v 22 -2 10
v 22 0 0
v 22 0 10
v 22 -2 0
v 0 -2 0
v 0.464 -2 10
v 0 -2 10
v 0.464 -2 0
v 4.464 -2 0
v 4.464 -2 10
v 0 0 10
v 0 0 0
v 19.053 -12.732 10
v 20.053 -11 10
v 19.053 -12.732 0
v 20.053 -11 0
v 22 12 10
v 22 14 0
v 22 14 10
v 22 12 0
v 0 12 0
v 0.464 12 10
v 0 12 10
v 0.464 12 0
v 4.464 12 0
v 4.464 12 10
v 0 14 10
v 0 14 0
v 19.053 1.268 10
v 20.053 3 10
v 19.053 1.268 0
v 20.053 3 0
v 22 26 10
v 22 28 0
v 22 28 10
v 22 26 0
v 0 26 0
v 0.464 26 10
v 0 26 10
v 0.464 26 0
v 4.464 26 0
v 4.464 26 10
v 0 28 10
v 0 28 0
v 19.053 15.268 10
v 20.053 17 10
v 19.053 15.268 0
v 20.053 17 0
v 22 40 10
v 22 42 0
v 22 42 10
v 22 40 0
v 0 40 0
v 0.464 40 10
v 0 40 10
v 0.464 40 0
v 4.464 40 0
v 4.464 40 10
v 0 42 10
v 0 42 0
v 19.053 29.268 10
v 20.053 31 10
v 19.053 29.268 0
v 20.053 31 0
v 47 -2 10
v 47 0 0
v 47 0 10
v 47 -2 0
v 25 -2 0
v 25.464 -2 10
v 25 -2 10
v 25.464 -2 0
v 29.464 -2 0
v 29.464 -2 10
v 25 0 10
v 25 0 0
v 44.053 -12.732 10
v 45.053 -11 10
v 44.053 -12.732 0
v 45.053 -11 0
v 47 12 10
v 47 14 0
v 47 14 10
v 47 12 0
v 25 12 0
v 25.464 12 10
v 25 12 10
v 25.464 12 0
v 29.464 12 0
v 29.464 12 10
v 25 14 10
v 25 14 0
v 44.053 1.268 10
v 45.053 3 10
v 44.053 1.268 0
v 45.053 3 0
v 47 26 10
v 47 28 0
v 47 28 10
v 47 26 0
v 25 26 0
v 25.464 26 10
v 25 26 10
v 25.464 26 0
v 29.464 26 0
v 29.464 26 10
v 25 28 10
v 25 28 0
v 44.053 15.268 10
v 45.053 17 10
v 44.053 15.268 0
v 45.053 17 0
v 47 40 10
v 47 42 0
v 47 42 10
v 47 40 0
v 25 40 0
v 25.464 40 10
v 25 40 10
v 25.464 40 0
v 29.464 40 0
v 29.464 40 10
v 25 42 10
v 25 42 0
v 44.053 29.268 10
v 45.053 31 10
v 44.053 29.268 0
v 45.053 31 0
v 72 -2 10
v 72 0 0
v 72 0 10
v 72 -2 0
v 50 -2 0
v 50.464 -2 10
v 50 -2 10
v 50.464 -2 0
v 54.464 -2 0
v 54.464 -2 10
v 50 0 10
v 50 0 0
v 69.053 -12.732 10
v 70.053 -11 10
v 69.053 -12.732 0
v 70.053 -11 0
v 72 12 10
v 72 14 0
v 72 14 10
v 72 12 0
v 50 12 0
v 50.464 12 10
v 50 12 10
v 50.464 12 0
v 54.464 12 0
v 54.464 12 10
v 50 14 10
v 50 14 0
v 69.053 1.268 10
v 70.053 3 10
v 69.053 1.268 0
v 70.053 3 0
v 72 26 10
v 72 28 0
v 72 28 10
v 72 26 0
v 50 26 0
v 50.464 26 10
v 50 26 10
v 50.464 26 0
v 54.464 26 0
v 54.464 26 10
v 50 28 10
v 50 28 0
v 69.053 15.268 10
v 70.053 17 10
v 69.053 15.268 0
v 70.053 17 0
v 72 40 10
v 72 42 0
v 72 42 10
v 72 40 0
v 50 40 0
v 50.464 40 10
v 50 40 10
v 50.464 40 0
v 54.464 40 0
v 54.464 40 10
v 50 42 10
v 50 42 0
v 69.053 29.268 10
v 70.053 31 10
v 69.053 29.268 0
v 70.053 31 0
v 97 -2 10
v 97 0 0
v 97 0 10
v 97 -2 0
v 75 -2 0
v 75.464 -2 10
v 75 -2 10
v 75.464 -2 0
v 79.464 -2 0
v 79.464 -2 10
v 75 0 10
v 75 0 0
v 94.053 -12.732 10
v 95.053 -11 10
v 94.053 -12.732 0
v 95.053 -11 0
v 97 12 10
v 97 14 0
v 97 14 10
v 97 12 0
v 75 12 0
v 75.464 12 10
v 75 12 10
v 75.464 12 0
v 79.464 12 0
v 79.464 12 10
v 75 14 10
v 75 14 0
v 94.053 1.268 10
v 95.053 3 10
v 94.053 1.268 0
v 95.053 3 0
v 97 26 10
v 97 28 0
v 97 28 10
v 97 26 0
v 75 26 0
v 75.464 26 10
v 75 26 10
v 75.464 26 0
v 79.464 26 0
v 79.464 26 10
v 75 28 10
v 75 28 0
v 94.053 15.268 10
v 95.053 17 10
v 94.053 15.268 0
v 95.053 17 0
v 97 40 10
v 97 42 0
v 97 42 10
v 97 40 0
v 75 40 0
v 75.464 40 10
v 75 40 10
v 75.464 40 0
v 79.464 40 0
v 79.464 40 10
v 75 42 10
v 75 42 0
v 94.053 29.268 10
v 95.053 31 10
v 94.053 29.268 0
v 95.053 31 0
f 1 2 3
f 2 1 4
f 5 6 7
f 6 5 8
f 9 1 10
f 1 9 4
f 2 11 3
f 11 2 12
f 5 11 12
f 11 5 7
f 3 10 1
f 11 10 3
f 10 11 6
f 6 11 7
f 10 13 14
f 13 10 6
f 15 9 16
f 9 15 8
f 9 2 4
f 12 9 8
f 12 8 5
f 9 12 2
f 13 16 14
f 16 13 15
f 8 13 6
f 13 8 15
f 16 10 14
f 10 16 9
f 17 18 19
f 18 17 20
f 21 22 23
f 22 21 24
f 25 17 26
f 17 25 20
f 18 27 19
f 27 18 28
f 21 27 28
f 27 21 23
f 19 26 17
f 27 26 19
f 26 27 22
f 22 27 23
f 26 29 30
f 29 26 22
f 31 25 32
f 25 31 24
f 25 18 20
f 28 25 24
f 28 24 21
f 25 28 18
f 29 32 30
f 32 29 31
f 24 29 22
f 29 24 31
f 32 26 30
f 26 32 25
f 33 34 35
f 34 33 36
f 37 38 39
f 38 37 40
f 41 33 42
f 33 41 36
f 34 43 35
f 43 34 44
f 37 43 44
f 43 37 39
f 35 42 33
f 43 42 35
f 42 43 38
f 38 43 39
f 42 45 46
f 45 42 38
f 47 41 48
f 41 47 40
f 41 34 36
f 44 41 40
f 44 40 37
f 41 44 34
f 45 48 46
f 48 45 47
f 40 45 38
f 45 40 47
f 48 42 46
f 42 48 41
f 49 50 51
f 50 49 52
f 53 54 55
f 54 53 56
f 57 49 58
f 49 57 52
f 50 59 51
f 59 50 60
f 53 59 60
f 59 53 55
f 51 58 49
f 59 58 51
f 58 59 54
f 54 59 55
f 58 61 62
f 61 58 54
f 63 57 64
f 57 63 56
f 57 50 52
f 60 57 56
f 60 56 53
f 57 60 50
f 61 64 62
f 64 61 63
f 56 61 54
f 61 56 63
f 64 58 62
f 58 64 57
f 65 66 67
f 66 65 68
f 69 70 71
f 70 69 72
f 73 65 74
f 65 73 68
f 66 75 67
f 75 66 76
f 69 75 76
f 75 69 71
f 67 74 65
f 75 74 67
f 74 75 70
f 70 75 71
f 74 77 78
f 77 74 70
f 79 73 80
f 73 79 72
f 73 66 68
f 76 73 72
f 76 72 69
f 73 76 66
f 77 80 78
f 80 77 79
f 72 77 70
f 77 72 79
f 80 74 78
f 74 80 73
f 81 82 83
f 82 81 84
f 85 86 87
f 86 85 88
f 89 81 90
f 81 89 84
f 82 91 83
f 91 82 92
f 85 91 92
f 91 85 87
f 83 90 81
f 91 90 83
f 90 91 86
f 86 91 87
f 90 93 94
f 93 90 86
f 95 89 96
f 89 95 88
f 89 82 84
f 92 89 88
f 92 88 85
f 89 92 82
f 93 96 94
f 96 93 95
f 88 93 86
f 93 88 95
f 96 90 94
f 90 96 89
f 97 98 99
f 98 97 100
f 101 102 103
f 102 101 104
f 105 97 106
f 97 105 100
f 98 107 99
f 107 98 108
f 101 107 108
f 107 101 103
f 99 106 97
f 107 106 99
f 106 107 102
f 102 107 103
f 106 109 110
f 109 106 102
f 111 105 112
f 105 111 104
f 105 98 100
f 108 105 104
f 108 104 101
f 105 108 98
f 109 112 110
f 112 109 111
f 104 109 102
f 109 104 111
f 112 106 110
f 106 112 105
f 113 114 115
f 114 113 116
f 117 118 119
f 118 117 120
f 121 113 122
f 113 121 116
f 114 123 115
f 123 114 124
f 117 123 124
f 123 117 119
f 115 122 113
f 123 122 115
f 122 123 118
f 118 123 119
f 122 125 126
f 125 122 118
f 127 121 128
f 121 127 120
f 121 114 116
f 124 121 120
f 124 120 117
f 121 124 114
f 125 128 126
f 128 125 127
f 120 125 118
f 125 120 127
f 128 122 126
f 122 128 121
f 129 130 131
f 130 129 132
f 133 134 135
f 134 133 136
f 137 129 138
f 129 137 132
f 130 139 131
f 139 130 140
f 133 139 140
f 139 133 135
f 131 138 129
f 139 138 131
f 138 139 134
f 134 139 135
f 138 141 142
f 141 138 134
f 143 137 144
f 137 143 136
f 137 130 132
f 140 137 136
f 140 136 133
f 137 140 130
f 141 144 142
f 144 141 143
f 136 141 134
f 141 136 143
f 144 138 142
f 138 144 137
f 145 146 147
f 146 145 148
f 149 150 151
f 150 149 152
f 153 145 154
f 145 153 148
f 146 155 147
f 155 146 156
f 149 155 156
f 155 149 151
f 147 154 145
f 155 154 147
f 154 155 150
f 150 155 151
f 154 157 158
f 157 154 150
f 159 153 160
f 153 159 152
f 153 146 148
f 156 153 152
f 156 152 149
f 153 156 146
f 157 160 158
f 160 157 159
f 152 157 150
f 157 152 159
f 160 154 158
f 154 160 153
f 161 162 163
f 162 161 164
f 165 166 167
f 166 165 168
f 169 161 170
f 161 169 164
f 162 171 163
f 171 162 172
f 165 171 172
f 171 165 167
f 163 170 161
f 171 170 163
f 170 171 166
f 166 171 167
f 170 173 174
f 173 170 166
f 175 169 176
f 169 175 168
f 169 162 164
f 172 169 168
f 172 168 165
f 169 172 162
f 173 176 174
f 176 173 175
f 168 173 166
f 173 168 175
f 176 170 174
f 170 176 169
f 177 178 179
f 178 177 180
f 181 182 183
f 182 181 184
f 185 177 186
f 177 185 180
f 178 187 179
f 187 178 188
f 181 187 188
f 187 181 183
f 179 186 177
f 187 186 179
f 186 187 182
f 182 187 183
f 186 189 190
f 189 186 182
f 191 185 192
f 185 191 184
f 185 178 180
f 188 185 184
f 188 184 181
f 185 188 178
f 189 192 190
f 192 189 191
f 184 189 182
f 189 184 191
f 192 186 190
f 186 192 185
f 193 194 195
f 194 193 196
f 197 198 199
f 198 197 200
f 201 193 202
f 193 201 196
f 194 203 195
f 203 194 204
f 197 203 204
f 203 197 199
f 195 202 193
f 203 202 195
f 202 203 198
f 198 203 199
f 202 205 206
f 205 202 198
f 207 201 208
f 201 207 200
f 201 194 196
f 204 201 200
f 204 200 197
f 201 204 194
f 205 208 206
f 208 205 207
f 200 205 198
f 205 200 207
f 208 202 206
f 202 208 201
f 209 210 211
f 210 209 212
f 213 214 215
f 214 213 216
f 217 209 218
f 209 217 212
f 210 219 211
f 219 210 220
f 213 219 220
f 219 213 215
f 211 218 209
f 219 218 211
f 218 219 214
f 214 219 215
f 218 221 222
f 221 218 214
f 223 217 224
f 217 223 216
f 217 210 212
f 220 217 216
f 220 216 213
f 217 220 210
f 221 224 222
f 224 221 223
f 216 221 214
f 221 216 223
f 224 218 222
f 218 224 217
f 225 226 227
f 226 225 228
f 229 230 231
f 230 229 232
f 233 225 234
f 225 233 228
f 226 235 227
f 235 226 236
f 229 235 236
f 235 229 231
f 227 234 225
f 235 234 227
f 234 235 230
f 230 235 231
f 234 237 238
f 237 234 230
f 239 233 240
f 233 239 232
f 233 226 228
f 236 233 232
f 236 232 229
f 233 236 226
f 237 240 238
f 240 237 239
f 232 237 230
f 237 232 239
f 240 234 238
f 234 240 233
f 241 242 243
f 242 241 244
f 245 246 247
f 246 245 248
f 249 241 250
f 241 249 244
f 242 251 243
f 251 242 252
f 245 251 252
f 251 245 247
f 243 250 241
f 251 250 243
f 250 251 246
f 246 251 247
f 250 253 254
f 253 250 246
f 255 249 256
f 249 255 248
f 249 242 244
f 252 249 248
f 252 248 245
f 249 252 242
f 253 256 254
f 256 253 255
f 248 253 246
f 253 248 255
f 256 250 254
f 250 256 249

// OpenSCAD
$fa=0.5; // default minimum facet angle is now 0.5
$fs=0.5; // default minimum facet size is now 0.5 mm

base_size = [22, 10, 2];
clip_size = [base_size[0], base_size[1], base_size[2]];
clip_angle = 30;

separation = 3;

// Calculated
clip_offset = (base_size[1] - clip_size[1]) / 2;

for (x = [0:3]) {
    for (y = [0:3]) {
        translate([x * (base_size[0] + separation), y * (base_size[0] * sin(clip_angle) + separation), 0])
        rotate([90, 0, 0])
        union() {
            cube(base_size);
            translate([1, clip_offset, 0]) rotate([0, -clip_angle, 0]) cube(clip_size);
        }
    }
}
